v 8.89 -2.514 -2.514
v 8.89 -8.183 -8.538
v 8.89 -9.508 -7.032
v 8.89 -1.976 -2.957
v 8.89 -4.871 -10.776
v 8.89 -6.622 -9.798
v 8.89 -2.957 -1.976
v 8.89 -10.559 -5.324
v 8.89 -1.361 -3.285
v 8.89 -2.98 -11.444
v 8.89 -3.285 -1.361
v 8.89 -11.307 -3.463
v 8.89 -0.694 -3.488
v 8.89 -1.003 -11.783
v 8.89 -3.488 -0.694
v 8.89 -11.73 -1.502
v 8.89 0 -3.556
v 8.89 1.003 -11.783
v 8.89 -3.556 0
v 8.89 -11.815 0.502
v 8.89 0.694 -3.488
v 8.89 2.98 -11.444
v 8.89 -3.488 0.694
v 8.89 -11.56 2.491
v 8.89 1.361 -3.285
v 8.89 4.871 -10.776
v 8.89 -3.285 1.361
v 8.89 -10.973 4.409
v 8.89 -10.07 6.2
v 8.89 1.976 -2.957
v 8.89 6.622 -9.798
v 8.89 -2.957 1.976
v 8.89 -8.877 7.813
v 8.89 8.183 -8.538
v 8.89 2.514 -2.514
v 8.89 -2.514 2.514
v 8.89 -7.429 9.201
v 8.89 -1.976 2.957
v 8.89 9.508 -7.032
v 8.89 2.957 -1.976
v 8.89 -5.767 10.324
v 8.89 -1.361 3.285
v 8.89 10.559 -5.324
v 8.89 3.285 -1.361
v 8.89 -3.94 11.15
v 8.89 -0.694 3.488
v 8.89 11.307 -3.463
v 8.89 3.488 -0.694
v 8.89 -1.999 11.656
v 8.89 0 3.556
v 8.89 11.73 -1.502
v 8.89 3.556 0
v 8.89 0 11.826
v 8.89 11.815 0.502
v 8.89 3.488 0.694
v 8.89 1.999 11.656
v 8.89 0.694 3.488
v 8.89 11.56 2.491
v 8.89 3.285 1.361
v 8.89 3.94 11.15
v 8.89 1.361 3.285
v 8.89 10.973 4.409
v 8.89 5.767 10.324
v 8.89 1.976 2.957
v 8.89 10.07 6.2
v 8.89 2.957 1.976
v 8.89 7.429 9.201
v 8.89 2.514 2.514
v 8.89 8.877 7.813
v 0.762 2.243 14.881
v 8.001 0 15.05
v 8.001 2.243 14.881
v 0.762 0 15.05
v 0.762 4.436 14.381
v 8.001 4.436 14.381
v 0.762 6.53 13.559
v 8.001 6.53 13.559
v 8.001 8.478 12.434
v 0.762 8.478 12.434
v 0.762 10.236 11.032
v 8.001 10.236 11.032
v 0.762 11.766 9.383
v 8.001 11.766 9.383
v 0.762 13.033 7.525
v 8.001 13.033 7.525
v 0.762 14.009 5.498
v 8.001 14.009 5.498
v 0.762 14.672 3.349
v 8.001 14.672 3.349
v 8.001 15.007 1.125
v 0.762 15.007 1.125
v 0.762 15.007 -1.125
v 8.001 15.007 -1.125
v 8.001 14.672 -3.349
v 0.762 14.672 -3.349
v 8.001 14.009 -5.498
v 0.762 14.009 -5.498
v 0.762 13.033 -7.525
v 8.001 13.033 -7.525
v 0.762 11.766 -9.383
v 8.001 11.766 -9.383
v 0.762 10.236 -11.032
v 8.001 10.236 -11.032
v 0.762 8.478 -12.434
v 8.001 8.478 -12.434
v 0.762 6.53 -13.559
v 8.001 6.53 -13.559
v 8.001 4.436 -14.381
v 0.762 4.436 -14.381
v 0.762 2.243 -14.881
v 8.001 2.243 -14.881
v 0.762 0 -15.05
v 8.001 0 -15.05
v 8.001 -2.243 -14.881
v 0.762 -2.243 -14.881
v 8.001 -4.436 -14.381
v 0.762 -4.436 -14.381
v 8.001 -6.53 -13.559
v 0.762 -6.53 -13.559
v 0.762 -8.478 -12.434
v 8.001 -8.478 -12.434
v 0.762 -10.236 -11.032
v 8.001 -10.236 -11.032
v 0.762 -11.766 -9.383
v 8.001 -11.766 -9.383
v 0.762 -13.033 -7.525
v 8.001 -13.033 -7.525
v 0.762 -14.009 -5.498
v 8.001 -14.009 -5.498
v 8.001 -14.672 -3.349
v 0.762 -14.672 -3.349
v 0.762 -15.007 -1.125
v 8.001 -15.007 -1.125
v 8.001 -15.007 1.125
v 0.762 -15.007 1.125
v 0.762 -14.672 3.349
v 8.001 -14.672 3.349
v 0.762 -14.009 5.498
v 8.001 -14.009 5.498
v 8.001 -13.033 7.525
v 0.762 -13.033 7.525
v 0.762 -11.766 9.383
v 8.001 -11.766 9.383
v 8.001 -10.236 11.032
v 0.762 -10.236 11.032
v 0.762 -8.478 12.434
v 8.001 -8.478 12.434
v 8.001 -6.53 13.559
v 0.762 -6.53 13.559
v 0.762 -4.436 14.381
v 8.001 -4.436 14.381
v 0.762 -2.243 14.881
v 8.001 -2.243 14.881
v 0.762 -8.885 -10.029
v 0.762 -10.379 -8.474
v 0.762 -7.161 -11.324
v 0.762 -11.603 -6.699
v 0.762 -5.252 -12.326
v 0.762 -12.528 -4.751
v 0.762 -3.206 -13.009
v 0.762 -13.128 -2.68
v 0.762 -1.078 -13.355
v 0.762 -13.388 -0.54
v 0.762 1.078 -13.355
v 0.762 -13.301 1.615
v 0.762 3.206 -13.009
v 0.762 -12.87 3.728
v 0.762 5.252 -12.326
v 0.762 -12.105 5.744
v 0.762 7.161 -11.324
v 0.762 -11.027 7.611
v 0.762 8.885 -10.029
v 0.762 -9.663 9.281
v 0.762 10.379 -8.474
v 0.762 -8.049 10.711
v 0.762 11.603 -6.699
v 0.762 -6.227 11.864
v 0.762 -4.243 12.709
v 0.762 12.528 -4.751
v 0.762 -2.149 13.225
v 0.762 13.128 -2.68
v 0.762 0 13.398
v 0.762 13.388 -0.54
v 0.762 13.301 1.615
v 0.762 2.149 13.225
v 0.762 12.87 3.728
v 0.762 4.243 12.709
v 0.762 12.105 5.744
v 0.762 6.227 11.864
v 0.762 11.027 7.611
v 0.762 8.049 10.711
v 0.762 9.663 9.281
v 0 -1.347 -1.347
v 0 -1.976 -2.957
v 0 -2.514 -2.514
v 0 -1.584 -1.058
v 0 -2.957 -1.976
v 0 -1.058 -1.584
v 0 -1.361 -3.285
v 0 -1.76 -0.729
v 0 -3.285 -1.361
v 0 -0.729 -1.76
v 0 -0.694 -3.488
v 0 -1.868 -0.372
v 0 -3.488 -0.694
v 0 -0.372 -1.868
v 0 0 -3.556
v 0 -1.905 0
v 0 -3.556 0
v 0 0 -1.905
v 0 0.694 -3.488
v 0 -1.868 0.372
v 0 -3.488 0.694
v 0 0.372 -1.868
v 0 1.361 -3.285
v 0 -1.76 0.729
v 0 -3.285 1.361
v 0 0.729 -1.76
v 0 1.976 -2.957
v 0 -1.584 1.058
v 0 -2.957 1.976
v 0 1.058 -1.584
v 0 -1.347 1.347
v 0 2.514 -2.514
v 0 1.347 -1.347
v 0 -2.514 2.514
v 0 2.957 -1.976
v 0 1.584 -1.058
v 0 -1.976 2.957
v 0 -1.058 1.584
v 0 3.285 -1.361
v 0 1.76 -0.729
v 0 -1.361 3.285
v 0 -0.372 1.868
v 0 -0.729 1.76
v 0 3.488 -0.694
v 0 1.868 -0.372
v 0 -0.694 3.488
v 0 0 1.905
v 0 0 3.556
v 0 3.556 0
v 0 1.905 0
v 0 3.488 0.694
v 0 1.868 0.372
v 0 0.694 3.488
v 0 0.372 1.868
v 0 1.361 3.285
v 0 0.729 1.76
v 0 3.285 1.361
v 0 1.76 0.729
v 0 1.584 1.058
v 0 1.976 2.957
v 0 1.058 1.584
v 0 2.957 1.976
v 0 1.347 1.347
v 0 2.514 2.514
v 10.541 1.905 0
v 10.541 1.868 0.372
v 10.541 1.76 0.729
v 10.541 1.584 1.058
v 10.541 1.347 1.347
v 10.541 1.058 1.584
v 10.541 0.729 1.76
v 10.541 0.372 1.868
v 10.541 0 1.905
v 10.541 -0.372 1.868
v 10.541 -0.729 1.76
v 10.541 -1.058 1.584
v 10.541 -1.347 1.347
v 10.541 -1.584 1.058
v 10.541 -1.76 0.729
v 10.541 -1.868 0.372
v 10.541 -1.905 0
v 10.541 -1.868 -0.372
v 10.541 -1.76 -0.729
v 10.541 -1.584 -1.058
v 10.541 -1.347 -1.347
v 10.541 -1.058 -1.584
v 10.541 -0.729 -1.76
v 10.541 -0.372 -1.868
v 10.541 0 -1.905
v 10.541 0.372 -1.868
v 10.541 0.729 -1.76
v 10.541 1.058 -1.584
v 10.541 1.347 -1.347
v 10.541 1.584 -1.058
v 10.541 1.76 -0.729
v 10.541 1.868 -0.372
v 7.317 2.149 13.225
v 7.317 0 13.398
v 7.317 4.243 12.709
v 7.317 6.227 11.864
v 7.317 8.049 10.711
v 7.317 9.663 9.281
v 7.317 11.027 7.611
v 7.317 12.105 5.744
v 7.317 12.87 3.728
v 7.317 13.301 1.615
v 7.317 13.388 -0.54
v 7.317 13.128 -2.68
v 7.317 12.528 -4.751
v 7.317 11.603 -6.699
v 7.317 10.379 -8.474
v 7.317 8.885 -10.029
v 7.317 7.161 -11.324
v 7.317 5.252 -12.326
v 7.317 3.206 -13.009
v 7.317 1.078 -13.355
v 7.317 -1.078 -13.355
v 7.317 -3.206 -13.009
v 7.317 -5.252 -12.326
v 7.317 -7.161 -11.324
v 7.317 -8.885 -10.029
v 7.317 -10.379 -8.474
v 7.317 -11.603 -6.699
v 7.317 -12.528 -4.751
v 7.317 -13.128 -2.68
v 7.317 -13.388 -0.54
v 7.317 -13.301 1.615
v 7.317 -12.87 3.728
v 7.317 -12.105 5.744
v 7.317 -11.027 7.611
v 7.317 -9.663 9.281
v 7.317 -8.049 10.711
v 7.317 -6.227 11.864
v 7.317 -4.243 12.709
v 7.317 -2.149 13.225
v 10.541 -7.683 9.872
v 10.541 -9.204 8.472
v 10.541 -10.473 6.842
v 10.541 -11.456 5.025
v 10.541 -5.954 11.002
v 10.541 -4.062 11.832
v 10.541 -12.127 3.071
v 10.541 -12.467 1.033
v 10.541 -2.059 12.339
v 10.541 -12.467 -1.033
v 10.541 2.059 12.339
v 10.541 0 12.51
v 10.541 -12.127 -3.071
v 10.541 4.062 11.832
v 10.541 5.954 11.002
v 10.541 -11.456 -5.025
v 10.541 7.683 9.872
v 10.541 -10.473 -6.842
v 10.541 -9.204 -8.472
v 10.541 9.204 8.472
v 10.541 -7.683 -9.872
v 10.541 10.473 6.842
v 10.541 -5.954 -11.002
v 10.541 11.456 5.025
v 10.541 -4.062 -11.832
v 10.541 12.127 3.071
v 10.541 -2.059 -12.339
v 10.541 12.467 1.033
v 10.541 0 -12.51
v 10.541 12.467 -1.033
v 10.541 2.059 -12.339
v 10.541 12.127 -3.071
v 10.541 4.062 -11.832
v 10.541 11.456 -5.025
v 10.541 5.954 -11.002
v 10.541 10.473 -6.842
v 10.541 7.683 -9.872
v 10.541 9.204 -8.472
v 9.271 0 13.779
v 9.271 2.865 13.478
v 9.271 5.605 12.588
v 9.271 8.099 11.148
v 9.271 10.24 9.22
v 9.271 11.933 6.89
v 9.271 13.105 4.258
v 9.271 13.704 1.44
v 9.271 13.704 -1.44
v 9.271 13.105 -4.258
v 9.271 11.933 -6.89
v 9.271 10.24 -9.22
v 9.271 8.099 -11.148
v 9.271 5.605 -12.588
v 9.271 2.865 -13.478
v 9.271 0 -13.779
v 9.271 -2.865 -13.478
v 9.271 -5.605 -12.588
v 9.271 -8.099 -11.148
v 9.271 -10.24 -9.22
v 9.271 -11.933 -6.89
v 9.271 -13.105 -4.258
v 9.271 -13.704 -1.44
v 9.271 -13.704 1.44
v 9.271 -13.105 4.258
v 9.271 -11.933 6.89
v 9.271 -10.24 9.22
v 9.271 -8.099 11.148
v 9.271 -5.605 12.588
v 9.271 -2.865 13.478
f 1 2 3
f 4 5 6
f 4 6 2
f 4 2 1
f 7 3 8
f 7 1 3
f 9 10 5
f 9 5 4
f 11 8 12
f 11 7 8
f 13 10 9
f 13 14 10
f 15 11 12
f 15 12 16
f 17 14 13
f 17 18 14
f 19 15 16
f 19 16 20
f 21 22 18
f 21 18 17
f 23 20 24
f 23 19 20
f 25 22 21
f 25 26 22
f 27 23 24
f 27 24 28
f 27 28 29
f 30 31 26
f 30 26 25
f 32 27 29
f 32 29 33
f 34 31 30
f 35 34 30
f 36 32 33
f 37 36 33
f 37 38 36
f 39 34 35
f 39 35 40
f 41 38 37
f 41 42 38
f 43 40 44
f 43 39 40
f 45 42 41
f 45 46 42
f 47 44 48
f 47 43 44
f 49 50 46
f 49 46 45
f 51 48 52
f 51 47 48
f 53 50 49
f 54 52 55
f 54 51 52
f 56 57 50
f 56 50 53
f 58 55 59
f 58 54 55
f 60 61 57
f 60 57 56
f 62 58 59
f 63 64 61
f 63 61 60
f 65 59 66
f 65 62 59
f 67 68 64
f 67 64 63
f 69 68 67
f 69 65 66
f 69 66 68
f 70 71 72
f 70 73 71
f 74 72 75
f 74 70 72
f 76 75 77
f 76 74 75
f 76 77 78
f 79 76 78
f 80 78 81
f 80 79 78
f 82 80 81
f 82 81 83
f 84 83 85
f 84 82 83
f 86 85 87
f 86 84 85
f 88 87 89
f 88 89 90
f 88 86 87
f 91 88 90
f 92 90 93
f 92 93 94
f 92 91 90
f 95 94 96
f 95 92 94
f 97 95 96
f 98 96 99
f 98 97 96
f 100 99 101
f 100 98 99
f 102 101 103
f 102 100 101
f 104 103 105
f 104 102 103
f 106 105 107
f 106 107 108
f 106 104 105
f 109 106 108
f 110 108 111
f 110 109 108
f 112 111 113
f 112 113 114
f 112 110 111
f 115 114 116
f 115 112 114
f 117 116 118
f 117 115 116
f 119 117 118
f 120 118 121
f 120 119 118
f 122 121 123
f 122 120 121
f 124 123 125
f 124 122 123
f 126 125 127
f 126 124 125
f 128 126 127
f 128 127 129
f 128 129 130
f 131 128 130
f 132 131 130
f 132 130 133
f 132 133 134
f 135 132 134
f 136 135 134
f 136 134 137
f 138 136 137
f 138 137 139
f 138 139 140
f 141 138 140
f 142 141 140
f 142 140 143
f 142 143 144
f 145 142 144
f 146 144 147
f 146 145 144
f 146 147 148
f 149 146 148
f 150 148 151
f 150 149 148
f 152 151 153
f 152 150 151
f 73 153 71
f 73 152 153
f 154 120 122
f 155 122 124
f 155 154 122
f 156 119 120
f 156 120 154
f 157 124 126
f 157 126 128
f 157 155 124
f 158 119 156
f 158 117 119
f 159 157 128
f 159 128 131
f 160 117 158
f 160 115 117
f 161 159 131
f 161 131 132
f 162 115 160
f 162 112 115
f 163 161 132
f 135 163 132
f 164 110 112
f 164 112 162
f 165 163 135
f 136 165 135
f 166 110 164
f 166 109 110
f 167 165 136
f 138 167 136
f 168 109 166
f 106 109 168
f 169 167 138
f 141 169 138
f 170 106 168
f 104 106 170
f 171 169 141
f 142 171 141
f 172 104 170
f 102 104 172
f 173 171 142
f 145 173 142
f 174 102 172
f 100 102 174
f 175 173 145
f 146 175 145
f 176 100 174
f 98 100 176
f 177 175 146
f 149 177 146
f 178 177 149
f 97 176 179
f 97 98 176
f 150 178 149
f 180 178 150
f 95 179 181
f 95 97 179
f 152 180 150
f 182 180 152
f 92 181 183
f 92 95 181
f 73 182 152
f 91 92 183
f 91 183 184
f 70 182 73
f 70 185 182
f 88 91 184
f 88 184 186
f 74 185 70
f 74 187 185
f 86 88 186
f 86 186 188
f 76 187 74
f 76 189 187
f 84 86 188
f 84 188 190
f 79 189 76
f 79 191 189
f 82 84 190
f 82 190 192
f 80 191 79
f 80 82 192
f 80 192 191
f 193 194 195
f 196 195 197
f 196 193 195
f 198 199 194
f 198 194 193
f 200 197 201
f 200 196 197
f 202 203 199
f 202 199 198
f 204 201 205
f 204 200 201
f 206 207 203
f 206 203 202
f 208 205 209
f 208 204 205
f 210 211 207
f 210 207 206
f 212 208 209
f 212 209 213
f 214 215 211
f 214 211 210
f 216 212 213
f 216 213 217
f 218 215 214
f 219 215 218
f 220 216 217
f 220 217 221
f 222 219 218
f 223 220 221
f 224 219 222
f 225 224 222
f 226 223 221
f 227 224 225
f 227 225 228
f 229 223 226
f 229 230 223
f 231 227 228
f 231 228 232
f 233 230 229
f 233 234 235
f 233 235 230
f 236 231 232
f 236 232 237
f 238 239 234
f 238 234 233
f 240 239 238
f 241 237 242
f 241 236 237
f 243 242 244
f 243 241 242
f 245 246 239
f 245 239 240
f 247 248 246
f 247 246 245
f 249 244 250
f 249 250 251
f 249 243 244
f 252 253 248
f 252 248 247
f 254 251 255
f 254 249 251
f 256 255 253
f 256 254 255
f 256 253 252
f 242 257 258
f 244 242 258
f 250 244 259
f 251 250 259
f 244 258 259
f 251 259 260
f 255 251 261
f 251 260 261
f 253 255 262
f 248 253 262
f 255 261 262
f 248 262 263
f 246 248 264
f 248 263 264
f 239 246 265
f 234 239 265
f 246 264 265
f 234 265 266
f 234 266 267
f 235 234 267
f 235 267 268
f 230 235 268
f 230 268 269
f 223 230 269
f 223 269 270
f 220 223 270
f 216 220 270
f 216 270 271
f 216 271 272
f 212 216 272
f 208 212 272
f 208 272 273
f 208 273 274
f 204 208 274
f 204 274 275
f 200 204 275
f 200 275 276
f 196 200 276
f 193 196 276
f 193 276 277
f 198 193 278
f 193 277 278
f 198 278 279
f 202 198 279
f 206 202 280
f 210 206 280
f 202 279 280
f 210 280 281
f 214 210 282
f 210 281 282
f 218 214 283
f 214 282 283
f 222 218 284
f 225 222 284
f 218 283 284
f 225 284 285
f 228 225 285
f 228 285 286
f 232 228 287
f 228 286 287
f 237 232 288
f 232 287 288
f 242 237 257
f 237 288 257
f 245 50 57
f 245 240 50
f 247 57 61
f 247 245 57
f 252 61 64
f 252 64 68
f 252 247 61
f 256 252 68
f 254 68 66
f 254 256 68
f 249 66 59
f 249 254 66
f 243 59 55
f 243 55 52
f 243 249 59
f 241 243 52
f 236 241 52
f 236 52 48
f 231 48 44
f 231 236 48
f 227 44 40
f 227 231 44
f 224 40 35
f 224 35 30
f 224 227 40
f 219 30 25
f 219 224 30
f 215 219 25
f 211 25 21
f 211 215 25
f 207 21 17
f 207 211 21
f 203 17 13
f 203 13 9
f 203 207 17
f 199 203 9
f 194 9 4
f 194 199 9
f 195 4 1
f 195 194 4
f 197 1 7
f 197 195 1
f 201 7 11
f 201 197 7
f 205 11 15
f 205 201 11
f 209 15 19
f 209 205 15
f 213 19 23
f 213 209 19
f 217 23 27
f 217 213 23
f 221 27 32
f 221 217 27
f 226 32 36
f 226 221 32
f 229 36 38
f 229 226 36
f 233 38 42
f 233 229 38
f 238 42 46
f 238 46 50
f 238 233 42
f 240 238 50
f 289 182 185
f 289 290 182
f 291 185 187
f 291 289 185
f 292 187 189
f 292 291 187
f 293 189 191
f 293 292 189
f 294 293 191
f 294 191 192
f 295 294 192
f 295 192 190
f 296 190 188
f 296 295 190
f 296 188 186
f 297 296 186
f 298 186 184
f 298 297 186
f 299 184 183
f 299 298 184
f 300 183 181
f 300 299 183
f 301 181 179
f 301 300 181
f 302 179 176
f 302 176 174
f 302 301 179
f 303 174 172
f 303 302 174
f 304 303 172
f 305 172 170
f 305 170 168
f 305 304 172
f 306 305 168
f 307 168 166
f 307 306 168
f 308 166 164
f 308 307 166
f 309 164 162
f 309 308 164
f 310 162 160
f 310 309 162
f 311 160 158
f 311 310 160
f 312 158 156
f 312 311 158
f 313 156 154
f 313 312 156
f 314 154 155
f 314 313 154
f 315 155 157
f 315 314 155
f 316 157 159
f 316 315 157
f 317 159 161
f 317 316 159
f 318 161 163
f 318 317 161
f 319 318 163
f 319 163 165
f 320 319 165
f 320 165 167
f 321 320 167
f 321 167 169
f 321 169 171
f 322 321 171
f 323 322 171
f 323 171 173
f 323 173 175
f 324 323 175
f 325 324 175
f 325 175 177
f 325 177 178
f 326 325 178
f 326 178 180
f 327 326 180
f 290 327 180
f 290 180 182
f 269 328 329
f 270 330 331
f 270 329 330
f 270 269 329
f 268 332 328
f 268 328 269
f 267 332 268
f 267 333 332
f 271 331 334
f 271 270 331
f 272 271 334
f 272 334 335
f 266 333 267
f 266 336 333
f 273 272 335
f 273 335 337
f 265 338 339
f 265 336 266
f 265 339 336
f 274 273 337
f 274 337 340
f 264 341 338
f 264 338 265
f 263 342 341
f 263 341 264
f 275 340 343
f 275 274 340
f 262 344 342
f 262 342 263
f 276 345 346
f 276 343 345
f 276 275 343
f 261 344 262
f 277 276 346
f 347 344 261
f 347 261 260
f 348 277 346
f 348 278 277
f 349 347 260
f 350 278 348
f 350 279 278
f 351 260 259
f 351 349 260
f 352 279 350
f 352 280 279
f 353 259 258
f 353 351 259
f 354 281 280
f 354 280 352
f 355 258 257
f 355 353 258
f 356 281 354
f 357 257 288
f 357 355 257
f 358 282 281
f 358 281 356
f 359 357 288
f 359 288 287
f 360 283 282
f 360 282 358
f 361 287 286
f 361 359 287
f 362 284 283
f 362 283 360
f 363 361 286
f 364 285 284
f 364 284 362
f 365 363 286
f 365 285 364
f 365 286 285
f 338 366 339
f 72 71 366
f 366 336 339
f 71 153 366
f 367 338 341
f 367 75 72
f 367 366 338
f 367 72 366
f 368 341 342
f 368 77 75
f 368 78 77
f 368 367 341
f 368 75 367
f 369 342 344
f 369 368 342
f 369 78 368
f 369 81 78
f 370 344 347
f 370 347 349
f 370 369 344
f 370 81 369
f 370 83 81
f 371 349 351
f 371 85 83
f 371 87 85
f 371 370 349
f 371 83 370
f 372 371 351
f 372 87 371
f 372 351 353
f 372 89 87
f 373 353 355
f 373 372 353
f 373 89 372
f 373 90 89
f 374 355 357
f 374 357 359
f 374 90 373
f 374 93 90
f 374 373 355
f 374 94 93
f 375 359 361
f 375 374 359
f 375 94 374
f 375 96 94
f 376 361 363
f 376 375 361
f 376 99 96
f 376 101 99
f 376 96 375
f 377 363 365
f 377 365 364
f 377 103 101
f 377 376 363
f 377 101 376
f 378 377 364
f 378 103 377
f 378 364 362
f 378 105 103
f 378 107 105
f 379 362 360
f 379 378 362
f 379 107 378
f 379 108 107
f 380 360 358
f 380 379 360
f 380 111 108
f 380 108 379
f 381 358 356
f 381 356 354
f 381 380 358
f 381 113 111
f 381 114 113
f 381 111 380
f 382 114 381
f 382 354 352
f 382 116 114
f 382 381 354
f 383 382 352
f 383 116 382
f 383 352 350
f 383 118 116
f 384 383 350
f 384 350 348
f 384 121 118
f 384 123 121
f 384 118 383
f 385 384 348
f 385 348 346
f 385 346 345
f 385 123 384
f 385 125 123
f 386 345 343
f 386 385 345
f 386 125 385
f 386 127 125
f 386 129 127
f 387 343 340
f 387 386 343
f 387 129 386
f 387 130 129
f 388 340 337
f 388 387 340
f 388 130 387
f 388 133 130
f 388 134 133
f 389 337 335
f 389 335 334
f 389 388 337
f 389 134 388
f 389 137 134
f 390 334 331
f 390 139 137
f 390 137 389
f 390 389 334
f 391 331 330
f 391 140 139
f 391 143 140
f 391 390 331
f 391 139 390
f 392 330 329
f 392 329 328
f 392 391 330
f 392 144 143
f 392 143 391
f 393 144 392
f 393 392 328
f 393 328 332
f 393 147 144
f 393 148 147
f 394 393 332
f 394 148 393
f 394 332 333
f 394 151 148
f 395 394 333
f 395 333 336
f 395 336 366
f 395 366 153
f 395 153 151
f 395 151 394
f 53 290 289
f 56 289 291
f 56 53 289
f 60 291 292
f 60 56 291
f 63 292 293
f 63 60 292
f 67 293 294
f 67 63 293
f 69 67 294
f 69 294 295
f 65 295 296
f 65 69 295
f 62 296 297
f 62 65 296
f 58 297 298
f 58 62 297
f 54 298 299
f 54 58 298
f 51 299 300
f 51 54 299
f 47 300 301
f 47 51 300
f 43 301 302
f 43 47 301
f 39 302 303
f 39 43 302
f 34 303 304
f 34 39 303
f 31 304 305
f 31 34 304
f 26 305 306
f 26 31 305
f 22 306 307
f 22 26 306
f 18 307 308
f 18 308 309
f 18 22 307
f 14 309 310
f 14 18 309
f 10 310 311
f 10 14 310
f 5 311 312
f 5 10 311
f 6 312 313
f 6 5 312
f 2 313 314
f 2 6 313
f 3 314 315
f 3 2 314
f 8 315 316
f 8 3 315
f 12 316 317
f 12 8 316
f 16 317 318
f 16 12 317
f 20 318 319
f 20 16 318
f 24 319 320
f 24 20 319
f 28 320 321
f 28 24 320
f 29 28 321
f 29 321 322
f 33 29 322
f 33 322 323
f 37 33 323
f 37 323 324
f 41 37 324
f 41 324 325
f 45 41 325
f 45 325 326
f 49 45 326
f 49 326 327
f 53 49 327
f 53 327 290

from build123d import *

# Parameters (mm, degrees)
F2_R     = 1.905
F3_DEPTH = 10.542


# Not quite as in the source:
# - a feature names something its author has since deleted; it is built from what else it names


with BuildPart() as f1:
    # F0 (on Front) → F1 (revolve)
    with BuildSketch(Plane.XZ):
        Polygon((8.001, 15.0495), (0.762, 15.0495), (0.762, 13.3985), (7.3171334085, 13.3985), (8.89, 11.8256334085), (8.89, 3.556), (0, 3.556), (0, 0), (10.541, 0), (10.541, 12.5095), align=None)
    revolve(axis=Axis((5.2705, 0, 0), (-1, 0, 0)))

    # F2 (on face) → F3 (cut, through all)
    with BuildSketch(Plane.YZ.offset(10.541)):
        Circle(F2_R)
    extrude(amount=-F3_DEPTH, mode=Mode.SUBTRACT)


solid = f1.part
